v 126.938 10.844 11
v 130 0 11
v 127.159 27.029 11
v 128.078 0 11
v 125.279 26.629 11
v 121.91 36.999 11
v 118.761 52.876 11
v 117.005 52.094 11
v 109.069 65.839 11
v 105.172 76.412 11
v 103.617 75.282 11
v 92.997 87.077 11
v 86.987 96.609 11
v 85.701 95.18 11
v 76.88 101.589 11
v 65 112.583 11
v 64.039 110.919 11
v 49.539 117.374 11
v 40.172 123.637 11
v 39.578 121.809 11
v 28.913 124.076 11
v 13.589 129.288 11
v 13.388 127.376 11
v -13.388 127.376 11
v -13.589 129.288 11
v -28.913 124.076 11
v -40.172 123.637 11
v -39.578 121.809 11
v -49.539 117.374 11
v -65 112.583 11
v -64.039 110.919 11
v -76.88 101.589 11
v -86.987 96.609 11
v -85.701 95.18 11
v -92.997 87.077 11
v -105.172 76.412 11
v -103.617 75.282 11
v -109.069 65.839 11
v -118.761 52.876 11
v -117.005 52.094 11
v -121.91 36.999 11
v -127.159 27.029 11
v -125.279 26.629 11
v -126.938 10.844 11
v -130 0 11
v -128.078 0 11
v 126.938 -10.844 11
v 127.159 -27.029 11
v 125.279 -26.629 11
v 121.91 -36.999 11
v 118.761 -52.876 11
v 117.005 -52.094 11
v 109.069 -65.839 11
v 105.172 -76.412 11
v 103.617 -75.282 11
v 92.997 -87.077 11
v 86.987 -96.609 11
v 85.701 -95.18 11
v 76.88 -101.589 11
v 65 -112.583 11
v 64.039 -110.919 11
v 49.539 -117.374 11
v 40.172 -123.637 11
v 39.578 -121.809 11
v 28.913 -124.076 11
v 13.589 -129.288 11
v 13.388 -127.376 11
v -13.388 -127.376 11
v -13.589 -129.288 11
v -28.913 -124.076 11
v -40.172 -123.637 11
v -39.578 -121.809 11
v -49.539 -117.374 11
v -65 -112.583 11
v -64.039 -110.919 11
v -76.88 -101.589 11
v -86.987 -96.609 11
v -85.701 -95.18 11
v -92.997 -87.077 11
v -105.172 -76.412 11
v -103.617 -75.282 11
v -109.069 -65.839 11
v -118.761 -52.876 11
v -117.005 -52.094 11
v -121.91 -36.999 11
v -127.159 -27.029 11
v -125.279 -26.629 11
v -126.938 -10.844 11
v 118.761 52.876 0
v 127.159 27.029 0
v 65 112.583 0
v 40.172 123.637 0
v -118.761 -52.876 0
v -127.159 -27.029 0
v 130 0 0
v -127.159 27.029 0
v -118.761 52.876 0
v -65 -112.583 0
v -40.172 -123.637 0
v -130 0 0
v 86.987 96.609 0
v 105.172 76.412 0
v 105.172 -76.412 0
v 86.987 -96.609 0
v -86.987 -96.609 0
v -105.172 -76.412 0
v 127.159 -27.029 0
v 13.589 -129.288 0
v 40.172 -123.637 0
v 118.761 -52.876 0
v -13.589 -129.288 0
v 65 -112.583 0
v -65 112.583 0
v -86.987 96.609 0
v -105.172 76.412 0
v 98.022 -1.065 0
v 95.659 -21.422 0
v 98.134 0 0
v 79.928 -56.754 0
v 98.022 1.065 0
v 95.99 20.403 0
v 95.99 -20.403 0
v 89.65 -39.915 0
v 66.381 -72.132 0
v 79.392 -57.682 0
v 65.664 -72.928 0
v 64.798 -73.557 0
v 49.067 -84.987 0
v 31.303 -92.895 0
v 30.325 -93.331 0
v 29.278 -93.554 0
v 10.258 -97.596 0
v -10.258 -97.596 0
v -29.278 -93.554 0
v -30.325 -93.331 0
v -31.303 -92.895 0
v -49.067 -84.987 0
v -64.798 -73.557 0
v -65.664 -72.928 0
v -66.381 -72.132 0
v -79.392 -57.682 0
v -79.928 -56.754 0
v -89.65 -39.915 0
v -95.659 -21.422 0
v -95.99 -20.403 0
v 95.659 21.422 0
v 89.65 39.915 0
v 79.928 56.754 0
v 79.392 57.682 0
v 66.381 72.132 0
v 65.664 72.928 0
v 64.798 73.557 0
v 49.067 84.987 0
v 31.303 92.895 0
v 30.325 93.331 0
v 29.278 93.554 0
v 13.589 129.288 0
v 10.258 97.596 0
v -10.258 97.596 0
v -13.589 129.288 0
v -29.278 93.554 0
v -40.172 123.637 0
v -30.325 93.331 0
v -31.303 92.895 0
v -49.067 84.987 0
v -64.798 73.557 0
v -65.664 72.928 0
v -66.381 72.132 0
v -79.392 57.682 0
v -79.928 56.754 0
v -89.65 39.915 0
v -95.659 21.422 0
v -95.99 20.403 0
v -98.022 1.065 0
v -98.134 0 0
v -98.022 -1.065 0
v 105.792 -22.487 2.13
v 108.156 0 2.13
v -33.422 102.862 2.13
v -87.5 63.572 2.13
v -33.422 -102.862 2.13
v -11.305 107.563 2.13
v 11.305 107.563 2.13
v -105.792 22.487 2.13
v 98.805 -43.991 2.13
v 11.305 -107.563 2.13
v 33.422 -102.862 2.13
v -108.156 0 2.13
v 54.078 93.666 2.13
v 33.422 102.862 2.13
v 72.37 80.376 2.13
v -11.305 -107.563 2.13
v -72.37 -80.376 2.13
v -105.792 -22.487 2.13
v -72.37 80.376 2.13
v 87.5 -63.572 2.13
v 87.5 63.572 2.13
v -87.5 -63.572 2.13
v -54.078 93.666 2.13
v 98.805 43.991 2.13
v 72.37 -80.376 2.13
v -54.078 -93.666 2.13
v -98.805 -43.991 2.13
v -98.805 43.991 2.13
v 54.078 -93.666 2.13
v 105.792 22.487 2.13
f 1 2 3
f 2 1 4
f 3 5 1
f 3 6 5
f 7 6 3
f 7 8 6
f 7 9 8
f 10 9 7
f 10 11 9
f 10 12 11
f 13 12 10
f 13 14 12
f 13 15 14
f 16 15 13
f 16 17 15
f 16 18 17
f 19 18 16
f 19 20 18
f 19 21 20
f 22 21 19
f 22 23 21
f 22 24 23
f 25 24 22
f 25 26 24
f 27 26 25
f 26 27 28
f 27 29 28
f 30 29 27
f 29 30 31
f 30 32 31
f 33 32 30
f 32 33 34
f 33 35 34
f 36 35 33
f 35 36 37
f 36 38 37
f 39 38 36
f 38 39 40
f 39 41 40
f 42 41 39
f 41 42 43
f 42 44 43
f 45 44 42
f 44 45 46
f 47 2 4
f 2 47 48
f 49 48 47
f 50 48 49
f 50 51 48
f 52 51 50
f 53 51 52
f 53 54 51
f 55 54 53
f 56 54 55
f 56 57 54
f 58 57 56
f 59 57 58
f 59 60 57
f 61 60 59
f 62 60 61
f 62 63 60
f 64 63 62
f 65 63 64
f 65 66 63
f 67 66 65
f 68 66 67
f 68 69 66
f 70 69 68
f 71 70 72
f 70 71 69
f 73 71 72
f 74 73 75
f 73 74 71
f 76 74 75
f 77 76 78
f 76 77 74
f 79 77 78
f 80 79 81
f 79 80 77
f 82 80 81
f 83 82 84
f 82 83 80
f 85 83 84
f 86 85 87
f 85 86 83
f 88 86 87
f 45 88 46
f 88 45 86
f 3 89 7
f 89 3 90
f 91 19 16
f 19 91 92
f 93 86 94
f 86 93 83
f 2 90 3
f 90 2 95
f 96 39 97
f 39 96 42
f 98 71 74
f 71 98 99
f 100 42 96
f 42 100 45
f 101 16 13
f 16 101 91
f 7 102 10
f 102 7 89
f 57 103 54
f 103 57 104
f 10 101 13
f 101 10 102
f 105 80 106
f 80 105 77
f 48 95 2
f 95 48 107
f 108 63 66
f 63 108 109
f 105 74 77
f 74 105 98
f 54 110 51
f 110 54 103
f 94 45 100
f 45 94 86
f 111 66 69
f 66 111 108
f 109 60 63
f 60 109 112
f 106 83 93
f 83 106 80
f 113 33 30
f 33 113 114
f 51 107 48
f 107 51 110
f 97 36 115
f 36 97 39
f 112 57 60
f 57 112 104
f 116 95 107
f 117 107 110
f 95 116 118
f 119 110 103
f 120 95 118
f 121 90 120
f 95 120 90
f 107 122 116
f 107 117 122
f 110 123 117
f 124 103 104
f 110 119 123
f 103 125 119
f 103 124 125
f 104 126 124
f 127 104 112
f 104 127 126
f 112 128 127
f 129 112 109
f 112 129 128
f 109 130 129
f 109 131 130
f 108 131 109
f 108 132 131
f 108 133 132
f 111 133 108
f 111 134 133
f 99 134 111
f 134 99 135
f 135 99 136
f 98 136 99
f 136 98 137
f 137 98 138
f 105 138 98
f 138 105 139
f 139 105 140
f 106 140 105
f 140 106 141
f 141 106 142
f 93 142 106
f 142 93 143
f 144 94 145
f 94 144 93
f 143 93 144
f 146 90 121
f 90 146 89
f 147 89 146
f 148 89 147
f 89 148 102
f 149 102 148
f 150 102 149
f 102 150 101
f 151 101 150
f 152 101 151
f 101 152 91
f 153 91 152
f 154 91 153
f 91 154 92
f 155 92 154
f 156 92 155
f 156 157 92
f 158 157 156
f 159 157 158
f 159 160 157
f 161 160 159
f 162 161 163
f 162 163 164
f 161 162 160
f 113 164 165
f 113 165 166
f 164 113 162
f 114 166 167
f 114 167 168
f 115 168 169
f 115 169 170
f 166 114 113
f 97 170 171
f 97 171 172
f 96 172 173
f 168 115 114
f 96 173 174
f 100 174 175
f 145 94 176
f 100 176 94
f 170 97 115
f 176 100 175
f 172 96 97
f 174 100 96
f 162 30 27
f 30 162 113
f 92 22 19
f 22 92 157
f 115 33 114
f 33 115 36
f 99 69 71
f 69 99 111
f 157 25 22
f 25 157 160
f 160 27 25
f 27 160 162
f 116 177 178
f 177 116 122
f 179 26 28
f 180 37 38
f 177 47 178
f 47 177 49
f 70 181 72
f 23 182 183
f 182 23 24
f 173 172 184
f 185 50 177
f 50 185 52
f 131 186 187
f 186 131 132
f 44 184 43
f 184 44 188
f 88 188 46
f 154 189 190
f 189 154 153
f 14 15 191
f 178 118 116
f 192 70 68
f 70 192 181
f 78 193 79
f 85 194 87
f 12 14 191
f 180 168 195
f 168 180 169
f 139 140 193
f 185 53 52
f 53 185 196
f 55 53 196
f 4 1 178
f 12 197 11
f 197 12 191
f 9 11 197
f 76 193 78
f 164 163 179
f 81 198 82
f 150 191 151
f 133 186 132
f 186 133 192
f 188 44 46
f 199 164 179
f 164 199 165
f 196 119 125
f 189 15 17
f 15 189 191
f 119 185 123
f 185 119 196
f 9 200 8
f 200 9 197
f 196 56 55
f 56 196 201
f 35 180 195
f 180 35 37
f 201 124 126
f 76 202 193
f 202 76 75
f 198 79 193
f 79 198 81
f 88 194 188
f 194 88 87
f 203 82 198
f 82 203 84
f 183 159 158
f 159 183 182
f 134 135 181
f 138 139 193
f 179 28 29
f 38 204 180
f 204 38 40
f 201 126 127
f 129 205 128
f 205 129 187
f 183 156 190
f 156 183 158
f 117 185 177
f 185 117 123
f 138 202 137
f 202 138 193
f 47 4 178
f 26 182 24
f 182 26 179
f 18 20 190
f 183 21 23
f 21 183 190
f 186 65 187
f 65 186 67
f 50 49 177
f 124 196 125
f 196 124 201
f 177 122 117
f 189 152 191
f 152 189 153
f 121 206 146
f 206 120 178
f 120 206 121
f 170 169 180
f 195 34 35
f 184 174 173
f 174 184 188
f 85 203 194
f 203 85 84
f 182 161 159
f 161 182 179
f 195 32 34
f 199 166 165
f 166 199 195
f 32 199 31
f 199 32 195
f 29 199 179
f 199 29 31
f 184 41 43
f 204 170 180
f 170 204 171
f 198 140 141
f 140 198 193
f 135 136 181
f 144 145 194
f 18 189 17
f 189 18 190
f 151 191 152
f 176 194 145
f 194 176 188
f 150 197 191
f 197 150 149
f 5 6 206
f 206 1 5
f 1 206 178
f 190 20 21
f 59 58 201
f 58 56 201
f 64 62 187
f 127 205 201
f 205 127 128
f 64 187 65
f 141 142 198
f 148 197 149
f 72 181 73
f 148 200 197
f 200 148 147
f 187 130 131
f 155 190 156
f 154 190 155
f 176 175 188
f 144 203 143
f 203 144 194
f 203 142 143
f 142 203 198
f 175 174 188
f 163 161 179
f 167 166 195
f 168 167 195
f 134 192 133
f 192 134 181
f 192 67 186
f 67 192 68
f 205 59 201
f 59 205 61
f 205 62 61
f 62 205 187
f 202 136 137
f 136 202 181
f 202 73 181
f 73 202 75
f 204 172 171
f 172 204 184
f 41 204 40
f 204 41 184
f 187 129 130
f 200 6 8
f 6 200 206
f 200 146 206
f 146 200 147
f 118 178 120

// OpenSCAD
// is a Thera Band 75cm ball
// has an actual diameter of around 68cm => 680mm
ball_radius = 340;
stand_height = 11;
stand_width = 130;

wiggle_room = 10;

difference() {
  // outer ring
  linear_extrude(height=stand_height)
    circle(r=stand_width);

  // ball
  translate([0, 0, ball_radius - 5]) {
    sphere(r=(ball_radius + wiggle_room));
  }
}
